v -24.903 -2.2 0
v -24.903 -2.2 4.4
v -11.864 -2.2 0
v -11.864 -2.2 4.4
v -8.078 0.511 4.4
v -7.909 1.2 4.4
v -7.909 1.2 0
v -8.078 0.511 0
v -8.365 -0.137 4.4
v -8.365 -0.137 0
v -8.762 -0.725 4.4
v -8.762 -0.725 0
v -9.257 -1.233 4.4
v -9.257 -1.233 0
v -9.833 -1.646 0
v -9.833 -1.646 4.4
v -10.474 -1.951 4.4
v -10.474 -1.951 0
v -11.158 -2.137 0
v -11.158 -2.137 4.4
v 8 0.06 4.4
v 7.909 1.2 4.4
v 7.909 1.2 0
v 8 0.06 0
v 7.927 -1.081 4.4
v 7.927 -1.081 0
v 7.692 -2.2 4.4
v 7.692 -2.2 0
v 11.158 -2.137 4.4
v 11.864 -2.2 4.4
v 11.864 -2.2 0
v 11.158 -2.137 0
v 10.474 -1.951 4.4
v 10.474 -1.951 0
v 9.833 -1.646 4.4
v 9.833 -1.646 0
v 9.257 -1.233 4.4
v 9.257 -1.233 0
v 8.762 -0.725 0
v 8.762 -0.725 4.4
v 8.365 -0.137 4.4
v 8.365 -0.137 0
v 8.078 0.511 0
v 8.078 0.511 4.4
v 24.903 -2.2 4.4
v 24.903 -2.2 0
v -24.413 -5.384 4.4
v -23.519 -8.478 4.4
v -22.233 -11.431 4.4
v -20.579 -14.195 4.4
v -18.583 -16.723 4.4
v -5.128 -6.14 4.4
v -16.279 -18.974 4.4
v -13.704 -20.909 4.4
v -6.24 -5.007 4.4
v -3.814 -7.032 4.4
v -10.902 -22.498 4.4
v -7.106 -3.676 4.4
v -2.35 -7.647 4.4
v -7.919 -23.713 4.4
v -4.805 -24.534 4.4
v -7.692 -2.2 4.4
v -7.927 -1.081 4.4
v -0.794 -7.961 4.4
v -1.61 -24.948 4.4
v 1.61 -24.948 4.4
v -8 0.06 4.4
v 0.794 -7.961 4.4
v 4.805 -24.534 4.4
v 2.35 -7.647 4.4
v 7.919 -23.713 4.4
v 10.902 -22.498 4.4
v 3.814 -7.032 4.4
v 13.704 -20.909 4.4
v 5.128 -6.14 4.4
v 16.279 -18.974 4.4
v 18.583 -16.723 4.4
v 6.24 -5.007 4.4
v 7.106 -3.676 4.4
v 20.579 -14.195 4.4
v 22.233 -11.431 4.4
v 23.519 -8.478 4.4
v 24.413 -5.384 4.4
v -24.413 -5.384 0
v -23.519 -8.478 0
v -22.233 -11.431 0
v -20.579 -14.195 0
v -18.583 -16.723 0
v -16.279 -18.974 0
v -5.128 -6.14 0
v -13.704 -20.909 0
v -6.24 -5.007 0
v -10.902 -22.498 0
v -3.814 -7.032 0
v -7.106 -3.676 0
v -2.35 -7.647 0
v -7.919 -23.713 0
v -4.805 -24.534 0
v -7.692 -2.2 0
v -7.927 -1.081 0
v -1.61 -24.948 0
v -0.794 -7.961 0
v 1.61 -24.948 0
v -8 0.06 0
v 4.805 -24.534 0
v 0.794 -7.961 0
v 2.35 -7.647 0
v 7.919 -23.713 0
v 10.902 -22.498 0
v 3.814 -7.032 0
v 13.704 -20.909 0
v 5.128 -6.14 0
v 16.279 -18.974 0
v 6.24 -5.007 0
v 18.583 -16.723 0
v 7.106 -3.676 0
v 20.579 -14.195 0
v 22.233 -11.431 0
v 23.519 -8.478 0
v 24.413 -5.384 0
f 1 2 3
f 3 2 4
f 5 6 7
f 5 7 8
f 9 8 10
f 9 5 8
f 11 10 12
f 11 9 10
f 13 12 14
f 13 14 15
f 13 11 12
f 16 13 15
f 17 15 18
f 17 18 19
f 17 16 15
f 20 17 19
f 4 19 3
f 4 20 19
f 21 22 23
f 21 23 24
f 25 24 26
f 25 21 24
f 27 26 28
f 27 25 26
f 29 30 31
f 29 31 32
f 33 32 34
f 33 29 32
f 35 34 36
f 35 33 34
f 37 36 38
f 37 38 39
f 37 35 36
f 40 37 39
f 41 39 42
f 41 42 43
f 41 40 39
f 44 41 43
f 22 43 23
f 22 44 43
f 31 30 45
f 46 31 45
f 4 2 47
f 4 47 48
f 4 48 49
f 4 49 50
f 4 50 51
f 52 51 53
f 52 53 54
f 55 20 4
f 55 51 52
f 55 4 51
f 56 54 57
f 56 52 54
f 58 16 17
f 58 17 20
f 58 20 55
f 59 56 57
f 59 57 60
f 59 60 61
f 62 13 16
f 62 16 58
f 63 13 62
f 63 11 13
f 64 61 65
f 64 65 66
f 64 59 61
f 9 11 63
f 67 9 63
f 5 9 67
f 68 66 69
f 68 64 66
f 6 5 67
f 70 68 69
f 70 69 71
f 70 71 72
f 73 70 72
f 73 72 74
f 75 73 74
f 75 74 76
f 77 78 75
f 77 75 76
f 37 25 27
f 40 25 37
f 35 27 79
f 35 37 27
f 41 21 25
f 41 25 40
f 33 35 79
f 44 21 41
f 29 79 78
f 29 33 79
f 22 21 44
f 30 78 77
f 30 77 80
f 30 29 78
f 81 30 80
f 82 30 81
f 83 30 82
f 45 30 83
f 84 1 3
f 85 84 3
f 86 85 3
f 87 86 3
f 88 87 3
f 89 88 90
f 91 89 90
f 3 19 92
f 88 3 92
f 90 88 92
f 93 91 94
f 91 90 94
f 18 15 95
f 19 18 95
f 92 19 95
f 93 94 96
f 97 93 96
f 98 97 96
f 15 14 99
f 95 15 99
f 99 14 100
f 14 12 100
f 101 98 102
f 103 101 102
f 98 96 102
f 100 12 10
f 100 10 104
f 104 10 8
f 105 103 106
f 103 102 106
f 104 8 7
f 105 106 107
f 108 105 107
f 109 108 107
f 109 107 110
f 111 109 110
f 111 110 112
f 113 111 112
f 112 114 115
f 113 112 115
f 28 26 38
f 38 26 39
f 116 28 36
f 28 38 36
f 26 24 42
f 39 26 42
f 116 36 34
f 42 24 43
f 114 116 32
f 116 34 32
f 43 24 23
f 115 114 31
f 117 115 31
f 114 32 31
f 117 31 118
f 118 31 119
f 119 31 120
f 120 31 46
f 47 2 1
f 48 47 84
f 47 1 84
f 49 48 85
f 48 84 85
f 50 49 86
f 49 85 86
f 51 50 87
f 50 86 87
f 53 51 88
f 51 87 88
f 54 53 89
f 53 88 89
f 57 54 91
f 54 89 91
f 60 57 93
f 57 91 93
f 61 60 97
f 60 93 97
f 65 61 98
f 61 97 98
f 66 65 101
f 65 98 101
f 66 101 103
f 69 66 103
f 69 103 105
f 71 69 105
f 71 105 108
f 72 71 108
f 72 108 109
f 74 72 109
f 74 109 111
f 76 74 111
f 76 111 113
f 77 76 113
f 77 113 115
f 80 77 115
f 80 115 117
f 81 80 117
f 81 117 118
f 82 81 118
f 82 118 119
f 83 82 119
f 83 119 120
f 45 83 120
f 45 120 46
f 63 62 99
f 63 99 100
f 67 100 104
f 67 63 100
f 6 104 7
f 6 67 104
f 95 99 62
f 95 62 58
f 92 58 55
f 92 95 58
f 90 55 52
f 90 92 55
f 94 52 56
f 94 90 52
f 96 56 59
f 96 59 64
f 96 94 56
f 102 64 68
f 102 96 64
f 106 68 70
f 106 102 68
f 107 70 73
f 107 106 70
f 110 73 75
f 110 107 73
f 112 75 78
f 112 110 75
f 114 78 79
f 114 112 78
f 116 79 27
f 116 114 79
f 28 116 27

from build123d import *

# Parameters (mm, degrees)
SKETCH1_R           = 25
SKETCH1_R_2         = 8
BASE_EXTRUDE_DEPTH  = 4.4
CUT_EXTRUDE1_DEPTH  = 5.4
BOSS_EXTRUDE1_DEPTH = 4.4


with BuildPart() as part:
    # Sketch1 → Base-Extrude (new body)
    with BuildSketch(Plane.XY):
        Circle(SKETCH1_R)
        Circle(SKETCH1_R_2, mode=Mode.SUBTRACT)
    extrude(amount=BASE_EXTRUDE_DEPTH)

    # Sketch2 → Cut-Extrude1 (cut, through all)
    with BuildSketch(Plane.XY.offset(4.4)):
        Polygon((-31.283198073, -2.2), (32.499555714, -2.2), (32.499555714, 32.618237466), (-31.739332188, 32.618237466), align=None)
    extrude(amount=-CUT_EXTRUDE1_DEPTH, mode=Mode.SUBTRACT)

    # Sketch3 → Boss-Extrude1 (add)
    with BuildSketch(Plane.XY.offset(4.4)):
        with BuildLine():
            Line((7.691553809, -2.2), (11.86423196, -2.2))
            ThreePointArc((11.86423196, -2.2), (9.256550998, -1.233150178), (7.909487973, 1.2))
            ThreePointArc((7.909487973, 1.2), (7.983616109, -0.511736089), (7.691553809, -2.2))
        make_face()
        with BuildLine():
            Line((-11.86423196, -2.2), (-7.691553809, -2.2))
            ThreePointArc((-7.691553809, -2.2), (-7.983616109, -0.511736089), (-7.909487973, 1.2))
            ThreePointArc((-7.909487973, 1.2), (-9.256550998, -1.233150178), (-11.86423196, -2.2))
        make_face()
    extrude(amount=-BOSS_EXTRUDE1_DEPTH)


solid = part.part
